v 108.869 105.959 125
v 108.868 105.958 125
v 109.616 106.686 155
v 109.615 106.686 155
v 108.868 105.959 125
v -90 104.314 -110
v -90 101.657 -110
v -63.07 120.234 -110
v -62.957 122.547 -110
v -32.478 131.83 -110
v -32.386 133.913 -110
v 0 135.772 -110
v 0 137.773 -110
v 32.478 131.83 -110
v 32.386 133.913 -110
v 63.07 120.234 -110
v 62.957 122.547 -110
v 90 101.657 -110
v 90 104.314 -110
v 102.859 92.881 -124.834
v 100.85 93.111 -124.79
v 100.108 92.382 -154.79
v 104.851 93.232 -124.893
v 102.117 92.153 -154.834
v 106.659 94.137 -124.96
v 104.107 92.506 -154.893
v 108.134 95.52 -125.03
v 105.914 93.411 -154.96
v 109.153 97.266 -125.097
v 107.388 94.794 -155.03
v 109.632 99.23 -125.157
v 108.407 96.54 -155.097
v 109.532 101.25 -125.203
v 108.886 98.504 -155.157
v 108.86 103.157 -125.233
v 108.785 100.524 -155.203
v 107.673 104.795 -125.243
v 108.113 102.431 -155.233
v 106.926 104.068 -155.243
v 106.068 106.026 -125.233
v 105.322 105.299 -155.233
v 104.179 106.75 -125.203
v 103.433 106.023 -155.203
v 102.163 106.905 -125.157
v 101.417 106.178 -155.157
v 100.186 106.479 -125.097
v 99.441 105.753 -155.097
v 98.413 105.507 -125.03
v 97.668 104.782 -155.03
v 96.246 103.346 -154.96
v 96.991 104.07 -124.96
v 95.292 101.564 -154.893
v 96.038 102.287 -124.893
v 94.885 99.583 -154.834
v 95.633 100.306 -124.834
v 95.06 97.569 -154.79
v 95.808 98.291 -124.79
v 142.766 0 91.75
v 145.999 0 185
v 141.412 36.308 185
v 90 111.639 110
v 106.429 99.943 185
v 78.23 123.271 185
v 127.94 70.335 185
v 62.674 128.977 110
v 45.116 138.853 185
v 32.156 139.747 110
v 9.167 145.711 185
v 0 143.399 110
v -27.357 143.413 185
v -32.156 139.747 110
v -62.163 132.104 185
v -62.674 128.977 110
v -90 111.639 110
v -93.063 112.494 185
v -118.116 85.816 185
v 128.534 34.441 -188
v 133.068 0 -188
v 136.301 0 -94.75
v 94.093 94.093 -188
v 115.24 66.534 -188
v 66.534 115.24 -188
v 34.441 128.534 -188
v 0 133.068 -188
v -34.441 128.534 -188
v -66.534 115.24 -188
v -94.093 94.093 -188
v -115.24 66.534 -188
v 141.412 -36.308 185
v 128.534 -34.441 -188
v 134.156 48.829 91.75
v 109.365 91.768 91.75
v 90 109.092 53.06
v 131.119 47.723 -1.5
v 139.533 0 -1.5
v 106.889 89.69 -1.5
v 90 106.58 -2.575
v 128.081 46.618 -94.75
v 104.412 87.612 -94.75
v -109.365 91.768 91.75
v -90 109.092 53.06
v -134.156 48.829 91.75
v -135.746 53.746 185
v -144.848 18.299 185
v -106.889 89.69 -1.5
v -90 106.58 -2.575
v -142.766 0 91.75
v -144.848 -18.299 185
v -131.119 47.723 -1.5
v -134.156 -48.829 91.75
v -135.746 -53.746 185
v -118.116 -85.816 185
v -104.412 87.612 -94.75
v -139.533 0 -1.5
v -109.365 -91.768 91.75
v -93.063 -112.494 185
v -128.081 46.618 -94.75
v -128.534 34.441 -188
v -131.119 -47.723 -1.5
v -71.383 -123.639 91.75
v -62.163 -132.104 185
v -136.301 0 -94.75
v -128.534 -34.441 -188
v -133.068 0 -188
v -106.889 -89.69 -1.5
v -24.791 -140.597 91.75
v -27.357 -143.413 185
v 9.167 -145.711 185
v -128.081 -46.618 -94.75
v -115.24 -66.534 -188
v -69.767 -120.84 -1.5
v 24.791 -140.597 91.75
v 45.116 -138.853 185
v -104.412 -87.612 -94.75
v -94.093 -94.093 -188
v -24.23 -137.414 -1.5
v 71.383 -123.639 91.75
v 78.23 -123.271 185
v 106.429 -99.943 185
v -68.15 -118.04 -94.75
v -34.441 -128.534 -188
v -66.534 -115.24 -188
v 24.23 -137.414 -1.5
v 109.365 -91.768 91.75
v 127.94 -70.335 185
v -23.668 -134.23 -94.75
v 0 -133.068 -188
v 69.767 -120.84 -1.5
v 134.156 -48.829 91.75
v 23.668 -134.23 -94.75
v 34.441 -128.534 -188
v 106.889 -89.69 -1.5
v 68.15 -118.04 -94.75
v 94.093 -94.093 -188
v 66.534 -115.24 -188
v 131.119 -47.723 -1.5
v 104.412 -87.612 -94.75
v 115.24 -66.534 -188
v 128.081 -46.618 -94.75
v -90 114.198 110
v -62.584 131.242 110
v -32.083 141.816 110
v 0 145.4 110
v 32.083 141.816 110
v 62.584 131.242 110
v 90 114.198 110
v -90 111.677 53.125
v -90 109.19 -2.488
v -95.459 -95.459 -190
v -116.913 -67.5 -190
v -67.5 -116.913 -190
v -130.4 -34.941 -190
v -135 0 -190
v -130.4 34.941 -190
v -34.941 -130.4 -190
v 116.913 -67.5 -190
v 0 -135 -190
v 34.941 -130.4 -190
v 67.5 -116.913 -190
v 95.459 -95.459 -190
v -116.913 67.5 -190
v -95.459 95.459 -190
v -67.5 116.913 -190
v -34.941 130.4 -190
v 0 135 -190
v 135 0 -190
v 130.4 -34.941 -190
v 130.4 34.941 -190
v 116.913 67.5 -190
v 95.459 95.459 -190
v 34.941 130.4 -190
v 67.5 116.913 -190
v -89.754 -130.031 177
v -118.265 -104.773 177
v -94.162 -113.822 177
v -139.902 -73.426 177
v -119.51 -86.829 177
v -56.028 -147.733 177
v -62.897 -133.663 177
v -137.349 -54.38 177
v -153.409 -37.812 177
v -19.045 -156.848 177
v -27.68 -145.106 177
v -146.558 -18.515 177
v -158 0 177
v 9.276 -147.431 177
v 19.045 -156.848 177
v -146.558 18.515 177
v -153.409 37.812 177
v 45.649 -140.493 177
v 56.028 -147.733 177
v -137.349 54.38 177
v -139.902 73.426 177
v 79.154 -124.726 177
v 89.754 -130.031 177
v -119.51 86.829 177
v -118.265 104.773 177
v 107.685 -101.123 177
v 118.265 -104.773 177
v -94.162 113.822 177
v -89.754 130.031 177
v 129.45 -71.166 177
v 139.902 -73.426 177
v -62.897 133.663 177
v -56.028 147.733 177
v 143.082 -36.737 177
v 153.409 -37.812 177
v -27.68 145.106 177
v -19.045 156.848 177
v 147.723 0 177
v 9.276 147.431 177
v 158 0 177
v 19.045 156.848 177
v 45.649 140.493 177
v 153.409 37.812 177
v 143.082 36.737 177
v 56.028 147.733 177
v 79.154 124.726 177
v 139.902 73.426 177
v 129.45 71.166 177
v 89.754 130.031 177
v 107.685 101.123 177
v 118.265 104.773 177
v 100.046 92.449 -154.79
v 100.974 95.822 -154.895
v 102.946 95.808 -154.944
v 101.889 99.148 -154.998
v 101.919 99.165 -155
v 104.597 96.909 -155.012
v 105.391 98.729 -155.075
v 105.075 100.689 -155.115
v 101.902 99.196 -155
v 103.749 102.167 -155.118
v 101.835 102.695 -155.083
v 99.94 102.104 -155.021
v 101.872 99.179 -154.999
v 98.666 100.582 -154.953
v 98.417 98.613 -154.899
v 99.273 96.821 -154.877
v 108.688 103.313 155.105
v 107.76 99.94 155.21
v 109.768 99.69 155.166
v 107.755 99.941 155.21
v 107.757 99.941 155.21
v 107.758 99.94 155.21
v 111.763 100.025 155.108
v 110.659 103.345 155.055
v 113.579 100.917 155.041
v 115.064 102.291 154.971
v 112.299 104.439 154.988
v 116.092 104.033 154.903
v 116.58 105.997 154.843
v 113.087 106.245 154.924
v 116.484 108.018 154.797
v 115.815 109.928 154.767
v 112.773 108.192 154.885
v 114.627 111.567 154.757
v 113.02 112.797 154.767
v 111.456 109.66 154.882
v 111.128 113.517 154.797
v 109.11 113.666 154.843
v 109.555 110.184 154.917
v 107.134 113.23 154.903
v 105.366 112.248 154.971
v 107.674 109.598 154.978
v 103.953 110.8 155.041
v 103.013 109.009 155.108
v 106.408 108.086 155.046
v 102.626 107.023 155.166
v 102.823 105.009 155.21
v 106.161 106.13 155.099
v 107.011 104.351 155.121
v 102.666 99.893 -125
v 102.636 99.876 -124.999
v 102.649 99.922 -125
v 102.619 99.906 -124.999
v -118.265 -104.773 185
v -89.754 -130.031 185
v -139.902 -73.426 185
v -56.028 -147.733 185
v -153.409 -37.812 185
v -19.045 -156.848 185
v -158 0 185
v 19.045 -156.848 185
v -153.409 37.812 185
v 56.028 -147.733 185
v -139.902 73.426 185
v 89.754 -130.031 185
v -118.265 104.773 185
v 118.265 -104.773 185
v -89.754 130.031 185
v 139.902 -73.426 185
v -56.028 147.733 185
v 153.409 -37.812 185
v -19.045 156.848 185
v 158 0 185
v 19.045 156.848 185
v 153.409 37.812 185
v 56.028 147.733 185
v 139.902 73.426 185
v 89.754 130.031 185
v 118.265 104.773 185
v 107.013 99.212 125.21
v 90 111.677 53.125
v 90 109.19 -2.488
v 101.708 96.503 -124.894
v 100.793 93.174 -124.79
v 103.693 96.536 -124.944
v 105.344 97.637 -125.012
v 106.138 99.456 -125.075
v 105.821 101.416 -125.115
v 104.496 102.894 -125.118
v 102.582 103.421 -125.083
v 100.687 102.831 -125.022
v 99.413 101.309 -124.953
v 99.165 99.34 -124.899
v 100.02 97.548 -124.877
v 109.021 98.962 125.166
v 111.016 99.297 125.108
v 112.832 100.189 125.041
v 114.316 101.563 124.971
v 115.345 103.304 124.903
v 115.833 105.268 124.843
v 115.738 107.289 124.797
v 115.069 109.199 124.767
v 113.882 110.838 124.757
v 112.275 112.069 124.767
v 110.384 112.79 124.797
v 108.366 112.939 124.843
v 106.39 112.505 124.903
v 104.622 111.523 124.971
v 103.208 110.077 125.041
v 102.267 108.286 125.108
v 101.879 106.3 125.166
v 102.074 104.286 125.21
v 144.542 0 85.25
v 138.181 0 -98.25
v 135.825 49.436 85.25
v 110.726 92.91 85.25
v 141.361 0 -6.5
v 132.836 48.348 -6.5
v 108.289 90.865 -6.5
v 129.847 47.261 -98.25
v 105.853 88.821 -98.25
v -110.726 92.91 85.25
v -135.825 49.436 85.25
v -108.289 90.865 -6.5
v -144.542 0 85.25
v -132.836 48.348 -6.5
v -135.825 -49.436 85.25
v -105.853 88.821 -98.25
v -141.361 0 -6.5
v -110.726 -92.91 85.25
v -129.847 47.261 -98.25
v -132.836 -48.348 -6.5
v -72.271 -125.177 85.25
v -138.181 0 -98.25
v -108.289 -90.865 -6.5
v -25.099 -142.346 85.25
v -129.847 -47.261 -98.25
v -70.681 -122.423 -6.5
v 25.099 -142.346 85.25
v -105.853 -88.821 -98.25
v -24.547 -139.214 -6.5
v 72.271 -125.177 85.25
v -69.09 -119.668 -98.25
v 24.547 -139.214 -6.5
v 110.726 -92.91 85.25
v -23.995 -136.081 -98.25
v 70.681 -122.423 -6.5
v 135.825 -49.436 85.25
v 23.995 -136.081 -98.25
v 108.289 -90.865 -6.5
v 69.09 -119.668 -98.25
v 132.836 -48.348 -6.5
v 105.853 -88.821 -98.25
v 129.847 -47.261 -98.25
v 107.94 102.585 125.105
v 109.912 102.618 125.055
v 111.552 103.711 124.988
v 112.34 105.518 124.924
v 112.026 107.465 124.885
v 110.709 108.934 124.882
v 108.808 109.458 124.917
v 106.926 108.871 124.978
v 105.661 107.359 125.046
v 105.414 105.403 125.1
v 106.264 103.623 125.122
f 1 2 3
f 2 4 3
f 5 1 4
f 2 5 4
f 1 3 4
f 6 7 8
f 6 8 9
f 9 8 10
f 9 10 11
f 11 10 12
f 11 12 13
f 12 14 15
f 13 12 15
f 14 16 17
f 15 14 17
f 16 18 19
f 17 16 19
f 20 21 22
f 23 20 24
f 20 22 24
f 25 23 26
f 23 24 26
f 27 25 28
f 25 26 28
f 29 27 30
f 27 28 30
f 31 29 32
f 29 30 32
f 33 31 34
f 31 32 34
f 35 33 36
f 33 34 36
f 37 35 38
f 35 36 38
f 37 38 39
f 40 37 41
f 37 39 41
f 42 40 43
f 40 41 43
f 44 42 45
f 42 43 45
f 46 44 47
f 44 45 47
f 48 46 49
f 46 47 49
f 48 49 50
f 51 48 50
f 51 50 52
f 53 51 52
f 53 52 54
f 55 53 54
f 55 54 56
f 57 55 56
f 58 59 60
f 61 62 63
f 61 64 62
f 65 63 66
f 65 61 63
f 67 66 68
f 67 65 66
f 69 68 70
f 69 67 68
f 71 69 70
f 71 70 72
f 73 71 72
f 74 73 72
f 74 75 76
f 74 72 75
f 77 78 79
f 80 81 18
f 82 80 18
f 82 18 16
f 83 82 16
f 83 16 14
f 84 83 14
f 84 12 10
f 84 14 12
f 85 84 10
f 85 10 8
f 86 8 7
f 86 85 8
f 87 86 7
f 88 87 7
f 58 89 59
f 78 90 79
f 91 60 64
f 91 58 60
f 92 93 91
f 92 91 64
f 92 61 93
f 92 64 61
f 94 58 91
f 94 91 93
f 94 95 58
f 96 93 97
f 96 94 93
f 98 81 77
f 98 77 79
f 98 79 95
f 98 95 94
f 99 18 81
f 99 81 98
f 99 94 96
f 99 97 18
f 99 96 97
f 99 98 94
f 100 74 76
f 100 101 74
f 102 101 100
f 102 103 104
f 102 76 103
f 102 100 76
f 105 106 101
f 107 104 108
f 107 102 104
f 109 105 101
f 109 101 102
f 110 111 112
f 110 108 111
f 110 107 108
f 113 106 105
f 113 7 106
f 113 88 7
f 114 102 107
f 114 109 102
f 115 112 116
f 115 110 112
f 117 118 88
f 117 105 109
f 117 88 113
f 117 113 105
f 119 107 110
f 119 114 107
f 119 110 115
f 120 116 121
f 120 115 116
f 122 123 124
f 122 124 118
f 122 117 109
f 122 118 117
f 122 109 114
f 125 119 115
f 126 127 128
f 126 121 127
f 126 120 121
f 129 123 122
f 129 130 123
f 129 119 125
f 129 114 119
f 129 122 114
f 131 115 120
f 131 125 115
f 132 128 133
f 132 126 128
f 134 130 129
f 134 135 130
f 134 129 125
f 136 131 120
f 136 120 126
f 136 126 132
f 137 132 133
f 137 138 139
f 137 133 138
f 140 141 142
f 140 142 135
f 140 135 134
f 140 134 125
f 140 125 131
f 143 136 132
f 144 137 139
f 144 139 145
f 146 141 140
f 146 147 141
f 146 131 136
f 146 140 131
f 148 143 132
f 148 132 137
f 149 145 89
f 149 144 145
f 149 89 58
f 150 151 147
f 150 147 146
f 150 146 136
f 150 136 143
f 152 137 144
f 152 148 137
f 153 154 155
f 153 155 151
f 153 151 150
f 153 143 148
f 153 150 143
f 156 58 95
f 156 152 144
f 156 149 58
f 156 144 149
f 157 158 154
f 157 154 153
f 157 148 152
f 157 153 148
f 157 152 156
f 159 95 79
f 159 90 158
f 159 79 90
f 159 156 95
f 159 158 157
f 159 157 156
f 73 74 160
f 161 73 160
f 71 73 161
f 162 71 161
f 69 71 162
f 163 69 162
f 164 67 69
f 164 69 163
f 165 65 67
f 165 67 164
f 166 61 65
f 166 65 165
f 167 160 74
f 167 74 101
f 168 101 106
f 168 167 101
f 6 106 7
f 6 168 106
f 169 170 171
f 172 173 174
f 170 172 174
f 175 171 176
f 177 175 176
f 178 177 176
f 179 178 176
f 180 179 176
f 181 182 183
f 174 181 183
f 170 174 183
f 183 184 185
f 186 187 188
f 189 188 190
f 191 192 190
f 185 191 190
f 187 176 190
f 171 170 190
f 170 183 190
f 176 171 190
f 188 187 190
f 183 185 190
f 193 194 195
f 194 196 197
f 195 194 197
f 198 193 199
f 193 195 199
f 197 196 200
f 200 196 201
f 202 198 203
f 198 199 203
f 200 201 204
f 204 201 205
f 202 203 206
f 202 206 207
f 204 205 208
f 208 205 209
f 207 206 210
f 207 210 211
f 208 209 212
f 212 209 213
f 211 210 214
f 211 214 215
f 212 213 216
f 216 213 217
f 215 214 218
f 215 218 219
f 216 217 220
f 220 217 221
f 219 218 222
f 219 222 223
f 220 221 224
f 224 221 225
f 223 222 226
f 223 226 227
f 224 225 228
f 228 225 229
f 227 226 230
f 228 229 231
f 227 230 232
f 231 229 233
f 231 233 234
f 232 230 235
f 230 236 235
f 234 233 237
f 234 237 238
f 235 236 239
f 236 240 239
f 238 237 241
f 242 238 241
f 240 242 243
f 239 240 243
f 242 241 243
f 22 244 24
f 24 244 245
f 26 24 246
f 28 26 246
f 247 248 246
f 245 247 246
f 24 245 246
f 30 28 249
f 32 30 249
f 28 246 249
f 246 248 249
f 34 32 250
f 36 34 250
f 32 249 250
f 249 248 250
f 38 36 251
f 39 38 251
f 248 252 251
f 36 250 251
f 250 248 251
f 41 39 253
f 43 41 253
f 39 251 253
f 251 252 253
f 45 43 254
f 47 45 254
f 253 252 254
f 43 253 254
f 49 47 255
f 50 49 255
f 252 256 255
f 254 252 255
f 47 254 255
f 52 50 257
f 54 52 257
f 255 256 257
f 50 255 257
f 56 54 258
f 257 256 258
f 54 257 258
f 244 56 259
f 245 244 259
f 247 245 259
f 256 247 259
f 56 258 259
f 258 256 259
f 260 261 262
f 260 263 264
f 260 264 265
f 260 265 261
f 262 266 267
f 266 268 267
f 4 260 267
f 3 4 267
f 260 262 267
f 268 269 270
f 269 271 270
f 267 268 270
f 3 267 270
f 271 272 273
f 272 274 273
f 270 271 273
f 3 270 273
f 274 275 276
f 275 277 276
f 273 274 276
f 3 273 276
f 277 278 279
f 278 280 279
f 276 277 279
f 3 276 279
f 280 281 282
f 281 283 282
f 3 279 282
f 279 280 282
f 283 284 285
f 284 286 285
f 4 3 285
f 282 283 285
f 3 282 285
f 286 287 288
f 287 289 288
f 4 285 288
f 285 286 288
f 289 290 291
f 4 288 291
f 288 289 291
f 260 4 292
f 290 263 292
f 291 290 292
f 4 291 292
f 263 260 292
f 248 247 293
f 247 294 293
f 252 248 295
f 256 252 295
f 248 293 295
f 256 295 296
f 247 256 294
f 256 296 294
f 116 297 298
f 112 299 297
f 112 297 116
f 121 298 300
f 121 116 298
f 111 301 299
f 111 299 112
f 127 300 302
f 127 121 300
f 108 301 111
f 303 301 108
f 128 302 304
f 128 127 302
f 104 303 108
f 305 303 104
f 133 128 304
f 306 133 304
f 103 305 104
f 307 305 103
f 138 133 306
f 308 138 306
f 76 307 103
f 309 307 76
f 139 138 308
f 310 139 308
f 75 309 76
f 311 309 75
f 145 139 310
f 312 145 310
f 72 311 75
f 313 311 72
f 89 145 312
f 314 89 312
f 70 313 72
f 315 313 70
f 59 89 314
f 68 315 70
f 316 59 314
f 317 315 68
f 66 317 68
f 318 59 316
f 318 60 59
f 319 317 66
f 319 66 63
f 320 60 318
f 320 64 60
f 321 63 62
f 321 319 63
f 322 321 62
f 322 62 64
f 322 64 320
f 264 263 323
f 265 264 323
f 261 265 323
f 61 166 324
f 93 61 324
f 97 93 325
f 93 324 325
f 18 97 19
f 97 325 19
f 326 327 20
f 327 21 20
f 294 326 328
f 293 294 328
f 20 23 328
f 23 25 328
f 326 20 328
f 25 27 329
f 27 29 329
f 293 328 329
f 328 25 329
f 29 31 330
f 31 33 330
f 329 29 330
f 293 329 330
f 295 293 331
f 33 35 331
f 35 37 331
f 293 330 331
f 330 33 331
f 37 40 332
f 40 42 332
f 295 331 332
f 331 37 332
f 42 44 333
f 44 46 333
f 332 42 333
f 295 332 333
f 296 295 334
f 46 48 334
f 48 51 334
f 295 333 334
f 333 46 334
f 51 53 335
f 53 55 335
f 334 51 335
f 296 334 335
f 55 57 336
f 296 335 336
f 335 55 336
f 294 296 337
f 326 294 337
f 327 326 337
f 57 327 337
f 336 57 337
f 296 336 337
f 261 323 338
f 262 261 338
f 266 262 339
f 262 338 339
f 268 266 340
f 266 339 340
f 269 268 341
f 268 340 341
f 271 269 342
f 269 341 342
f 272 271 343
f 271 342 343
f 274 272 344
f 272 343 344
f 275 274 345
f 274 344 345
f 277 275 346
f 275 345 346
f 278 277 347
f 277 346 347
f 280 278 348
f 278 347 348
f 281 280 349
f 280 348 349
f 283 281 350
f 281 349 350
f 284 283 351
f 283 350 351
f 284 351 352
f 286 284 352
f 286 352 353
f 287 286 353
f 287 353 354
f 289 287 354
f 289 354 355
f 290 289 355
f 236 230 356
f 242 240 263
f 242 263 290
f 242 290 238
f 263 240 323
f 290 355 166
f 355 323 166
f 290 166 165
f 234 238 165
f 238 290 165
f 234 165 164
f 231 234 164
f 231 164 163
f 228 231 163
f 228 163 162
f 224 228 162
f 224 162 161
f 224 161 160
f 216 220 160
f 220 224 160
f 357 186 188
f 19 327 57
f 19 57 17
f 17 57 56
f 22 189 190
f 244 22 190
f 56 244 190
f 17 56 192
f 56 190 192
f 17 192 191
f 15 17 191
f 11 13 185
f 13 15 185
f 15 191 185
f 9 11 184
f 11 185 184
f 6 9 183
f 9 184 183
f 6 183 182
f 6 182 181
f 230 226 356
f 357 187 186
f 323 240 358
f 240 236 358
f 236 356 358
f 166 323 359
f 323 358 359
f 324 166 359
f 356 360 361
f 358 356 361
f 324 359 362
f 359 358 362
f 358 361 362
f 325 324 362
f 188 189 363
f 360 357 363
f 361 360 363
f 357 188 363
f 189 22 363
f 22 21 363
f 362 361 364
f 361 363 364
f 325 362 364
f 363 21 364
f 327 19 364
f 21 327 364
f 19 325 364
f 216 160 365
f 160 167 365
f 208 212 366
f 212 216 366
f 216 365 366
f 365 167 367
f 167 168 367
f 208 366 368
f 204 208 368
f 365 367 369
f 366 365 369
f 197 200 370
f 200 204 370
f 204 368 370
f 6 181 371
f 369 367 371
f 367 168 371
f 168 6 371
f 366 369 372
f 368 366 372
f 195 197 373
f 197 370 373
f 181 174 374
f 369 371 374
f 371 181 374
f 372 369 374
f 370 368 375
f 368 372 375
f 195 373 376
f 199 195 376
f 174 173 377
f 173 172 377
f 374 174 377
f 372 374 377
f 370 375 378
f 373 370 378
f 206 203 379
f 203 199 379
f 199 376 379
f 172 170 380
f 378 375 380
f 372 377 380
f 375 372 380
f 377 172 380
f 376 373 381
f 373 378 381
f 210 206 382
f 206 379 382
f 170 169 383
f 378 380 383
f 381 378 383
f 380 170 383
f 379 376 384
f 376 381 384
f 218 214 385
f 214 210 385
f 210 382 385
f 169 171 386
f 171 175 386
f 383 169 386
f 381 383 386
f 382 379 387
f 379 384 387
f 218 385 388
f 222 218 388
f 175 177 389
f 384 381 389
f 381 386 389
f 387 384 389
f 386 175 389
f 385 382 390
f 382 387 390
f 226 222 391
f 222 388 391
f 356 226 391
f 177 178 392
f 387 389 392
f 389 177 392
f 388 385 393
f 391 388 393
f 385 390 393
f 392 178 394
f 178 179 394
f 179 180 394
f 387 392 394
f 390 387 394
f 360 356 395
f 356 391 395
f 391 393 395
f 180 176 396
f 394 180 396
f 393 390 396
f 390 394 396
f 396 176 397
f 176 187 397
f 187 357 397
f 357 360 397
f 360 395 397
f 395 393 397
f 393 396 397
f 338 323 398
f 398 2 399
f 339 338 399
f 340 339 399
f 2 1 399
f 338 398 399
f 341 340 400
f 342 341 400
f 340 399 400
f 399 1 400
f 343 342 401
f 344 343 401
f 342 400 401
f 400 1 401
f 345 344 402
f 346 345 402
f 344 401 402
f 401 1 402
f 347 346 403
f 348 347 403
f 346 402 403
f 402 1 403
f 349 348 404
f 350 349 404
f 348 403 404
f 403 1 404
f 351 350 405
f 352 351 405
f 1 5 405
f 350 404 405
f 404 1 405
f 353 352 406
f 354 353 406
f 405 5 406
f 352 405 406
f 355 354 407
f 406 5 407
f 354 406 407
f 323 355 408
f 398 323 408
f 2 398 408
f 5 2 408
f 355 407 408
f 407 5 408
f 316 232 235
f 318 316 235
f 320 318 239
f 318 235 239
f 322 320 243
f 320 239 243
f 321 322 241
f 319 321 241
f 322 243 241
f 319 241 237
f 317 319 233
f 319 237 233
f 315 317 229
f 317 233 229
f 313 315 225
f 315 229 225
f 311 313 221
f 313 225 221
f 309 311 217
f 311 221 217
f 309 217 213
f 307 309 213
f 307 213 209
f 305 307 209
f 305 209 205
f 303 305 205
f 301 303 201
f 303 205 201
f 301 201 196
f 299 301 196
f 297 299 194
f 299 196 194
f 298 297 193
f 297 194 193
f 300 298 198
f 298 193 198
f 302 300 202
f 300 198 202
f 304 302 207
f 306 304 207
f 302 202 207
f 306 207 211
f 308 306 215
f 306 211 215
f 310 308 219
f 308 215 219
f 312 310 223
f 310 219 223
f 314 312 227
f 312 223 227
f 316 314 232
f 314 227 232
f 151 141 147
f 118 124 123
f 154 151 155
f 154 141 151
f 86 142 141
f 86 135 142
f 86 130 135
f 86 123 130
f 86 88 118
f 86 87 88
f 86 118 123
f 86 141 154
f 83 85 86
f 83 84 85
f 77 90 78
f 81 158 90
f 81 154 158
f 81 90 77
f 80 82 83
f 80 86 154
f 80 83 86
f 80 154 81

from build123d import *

# Parameters (mm, degrees)
TAPERED_PAIL_BLANK_START  = -190
PAIL_BASE_PROFILE_R       = 135
TAPERED_PAIL_BLANK_DEPTH  = 375
TAPERED_PAIL_BLANK_DRAFT  = -1.985458585
PAIL_WALL_2MM_T           = -2
PAIL_REINFORCED_RIM_START = 177
PAIL_RIM_PROFILE_R        = 158
PAIL_RIM_PROFILE_R_2      = 146
PAIL_REINFORCED_RIM_DEPTH = 8
LOADING_OPENING_PROFILE_W = 220
LOADING_OPENING_PROFILE_H = 250
TOP_LOADING_OPENING_DEPTH = 90


with BuildPart() as part:
    # Pail_Base_Profile → Tapered_Pail_Blank (with draft: the straight prism first)
    with BuildSketch(Plane.XY.offset(TAPERED_PAIL_BLANK_START)):
        Circle(PAIL_BASE_PROFILE_R)
    extrude(amount=TAPERED_PAIL_BLANK_DEPTH)
    # Tapered_Pail_Blank: the draft: its side faces are tilted about the plane it starts from
    tapered_pail_blank_sides = [part.faces().sort_by_distance(p)[0] for p in [
        (-135, 0, -2.5),
    ]]
    draft(tapered_pail_blank_sides, Plane.XY.offset(TAPERED_PAIL_BLANK_START), TAPERED_PAIL_BLANK_DRAFT)

    # Pail_Wall_2mm
    pail_wall_2mm_openings = [part.faces().sort_by_distance(p)[0] for p in [
        (0, 0, 185),
    ]]
    offset(amount=PAIL_WALL_2MM_T, openings=pail_wall_2mm_openings, kind=Kind.INTERSECTION)

    # Pail_Rim_Profile → Pail_Reinforced_Rim (add)
    with BuildSketch(Plane.XY.offset(PAIL_REINFORCED_RIM_START)):
        Circle(PAIL_RIM_PROFILE_R)
        Circle(PAIL_RIM_PROFILE_R_2, mode=Mode.SUBTRACT)
    extrude(amount=PAIL_REINFORCED_RIM_DEPTH)

    # Loading_Opening_Profile → Top_Loading_Opening (cut, symmetric)
    with BuildSketch(Plane(origin=(0, 0, 0), x_dir=(0, 0, -1), z_dir=(1, 0, 0))):
        with Locations((0, 125)):
            Rectangle(LOADING_OPENING_PROFILE_W, LOADING_OPENING_PROFILE_H)
    extrude(amount=TOP_LOADING_OPENING_DEPTH, both=True, mode=Mode.SUBTRACT)

    # Drum_Hinge_Knuckle_Profile → Drum_Hinge_Knuckles (revolve)
    with BuildSketch(Plane(origin=(0, 0, 0), x_dir=(0, 0, 1), z_dir=(0.6974653404967203, -0.7166185169291917, 0))):
        Polygon((-155, -142.213651728), (-125.000089364, -143.255770649), (-125.243089364, -150.251112671), (-155.243, -149.208993749), align=None)
        Polygon((125, -151.920290486), (154.999910636, -152.962409408), (154.756910636, -159.95775143), (124.757, -158.915632508), align=None)
    revolve(axis=Axis((101.521807726, 98.808418315, -169.999121159), (0.024888838213313905, 0.024223630298311177, 0.9993966987475805)))


solid = part.part
